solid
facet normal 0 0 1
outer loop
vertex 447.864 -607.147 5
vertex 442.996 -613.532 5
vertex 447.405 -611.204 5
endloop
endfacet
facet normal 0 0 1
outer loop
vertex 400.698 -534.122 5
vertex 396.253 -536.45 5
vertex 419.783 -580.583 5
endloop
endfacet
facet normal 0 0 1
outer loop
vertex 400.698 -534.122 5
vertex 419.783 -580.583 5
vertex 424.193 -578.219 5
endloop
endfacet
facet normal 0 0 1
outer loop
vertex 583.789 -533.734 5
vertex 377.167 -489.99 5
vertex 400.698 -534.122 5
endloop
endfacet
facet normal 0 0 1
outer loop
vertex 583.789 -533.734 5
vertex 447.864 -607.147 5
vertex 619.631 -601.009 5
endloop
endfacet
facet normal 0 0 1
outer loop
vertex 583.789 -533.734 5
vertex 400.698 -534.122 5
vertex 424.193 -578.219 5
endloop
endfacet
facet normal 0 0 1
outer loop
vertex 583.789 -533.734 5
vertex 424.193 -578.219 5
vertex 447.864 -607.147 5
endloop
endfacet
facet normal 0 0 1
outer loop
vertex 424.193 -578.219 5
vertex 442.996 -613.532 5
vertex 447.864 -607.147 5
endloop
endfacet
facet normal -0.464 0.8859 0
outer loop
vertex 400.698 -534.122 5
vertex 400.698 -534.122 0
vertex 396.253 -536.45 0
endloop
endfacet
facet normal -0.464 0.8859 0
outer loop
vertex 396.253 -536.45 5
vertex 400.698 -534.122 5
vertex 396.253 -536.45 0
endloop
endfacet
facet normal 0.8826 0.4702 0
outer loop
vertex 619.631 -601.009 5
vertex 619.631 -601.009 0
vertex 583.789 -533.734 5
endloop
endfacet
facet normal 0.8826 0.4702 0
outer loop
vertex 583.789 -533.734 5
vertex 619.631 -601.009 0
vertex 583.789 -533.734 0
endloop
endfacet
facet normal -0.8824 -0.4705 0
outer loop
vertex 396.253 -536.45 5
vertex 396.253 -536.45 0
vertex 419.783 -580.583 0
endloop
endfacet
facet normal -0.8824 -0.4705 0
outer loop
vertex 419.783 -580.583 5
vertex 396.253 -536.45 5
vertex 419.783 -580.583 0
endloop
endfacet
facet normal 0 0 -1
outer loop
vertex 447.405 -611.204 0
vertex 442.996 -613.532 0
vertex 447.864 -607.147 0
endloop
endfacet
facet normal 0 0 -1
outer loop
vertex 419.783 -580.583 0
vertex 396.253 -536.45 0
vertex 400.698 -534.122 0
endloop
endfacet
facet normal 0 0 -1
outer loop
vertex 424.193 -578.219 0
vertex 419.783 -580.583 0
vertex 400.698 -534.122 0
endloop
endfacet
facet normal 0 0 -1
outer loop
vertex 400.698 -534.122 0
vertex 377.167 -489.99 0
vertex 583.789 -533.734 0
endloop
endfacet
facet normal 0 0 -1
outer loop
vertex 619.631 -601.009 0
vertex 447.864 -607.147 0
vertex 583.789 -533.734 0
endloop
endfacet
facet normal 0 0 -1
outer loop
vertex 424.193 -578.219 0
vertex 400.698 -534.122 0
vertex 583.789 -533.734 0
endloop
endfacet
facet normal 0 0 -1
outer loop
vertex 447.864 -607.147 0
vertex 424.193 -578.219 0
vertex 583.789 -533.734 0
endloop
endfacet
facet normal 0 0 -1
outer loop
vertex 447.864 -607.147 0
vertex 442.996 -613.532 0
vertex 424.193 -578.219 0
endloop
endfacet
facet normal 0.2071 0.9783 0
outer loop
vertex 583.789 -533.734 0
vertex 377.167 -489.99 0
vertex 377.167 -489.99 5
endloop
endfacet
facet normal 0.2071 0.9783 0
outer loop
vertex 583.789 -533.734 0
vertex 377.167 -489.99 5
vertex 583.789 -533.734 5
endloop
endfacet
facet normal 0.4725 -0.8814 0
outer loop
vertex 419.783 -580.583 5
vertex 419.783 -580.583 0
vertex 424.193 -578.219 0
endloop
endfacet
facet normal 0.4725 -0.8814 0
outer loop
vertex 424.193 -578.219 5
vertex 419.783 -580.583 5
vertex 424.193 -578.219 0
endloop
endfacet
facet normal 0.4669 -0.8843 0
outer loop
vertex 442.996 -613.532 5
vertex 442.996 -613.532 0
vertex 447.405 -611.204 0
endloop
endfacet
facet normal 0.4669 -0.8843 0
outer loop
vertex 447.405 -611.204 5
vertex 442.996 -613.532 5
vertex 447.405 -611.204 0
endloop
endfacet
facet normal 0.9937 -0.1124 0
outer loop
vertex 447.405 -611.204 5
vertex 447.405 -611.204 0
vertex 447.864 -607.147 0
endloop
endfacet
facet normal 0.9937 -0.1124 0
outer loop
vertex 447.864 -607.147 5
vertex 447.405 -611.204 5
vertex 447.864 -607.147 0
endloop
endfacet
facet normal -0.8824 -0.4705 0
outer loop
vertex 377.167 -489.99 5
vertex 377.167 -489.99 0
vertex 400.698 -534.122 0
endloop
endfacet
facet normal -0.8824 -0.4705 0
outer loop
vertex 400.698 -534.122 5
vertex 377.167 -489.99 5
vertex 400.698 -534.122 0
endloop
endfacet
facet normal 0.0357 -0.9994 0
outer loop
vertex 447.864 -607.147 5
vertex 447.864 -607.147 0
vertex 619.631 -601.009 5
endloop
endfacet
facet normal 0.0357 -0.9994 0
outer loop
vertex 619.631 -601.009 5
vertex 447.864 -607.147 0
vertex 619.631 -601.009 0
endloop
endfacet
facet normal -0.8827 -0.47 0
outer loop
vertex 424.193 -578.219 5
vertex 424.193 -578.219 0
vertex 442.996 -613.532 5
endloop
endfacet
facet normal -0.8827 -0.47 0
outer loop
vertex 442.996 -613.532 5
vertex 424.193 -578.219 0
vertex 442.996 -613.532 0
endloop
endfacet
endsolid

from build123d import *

# Parameters (mm, degrees)
PAD006_DEPTH = 5


with BuildPart() as part:
    # Sketch007 → Pad006 (new body)
    with BuildSketch(Plane.XY):
        with BuildLine():
            add(Edge.make_bspline(
                [(377.167323, -489.989598), (400.6976, -534.122097)],
                knots=[0, 0, 141.770589, 141.770589], degree=1))
            add(Edge.make_bspline(
                [(400.6976, -534.122097), (396.2526, -536.45043)],
                knots=[0, 0, 14.223924, 14.223924], degree=1))
            add(Edge.make_bspline(
                [(396.2526, -536.45043), (419.782877, -580.582929)],
                knots=[0, 0, 141.770589, 141.770589], degree=1))
            add(Edge.make_bspline(
                [(419.782877, -580.582929), (424.1926, -578.219318)],
                knots=[0, 0, 14.182383, 14.182383], degree=1))
            add(Edge.make_bspline(
                [(424.1926, -578.219318), (442.995655, -613.532373)],
                knots=[0, 0, 113.405908, 113.405908], degree=1))
            add(Edge.make_bspline(
                [(442.995655, -613.532373), (447.405377, -611.20404)],
                knots=[0, 0, 14.135417, 14.135417], degree=1))
            add(Edge.make_bspline(
                [(447.405377, -611.20404), (447.863988, -607.147096)],
                knots=[0, 0, 11.573245, 11.573245], degree=1))
            add(Edge.make_bspline(
                [(447.863988, -607.147096), (619.631484, -601.008762)],
                knots=[0, 0, 487.210807, 487.210807], degree=1))
            add(Edge.make_bspline(
                [(619.631484, -601.008762), (583.789263, -533.734042)],
                knots=[0, 0, 216.076491, 216.076491], degree=1))
            add(Edge.make_bspline(
                [(377.167323, -489.989598), (583.789263, -533.734042)],
                knots=[0, 0, 598.682295, 598.682295], degree=1))
        make_face()
    extrude(amount=PAD006_DEPTH)


solid = part.part
